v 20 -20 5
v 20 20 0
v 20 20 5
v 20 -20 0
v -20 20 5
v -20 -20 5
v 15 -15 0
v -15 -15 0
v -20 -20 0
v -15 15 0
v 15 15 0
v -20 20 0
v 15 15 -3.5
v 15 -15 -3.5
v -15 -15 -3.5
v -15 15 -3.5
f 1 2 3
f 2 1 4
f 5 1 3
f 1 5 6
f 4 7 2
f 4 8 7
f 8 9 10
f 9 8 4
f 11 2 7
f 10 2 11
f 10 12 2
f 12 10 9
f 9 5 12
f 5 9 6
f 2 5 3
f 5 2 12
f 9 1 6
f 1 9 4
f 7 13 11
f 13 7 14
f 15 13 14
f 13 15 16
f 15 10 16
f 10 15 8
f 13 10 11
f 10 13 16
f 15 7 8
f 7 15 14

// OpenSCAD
basesize = 60;
baseheight = 5;
poleradi = 3;

height = 100;

module dings() {
    color([0,1,0]) {
        translate([0,0,baseheight/2])
            cube([basesize/1.5, basesize/1.5, baseheight], center=true);

        translate([0,0,-0.5])
            cube([basesize/2, basesize/2, baseheight+1], center=true);
    }
}

module bunn(margin) {
    color([1,0,0]) {
        union() {
            cube([basesize, basesize, baseheight], center=true);

            translate([basesize/2 - 2*poleradi,basesize/2 - 2*poleradi,0])
                cylinder(height, poleradi+margin, poleradi+margin, $fn=32);

            translate([-(basesize/2 - 2*poleradi), basesize/2 - 2*poleradi,0])
                cylinder(height, poleradi+margin, poleradi+margin, $fn=32);

            translate([basesize/2 - 2*poleradi, -(basesize/2 - 2*poleradi),0])
                cylinder(height, poleradi+margin, poleradi+margin, $fn=32);

            translate([-(basesize/2 - 2*poleradi),-(basesize/2 - 2*poleradi),0])
                cylinder(height, poleradi+margin, poleradi+margin, $fn=32);
        }
    }
}

module topp() {
    color([0,0,1]) {
        difference() {
            translate([0, 0, height - baseheight / 4]) {
                difference() {

                    cube([basesize, basesize, baseheight], center=true);
                    dings();
                }
            }
            bunn(0.2);
        }
    }
}

//translate([0, 0, height + 10])
dings();
//bunn(0);
//topp();
